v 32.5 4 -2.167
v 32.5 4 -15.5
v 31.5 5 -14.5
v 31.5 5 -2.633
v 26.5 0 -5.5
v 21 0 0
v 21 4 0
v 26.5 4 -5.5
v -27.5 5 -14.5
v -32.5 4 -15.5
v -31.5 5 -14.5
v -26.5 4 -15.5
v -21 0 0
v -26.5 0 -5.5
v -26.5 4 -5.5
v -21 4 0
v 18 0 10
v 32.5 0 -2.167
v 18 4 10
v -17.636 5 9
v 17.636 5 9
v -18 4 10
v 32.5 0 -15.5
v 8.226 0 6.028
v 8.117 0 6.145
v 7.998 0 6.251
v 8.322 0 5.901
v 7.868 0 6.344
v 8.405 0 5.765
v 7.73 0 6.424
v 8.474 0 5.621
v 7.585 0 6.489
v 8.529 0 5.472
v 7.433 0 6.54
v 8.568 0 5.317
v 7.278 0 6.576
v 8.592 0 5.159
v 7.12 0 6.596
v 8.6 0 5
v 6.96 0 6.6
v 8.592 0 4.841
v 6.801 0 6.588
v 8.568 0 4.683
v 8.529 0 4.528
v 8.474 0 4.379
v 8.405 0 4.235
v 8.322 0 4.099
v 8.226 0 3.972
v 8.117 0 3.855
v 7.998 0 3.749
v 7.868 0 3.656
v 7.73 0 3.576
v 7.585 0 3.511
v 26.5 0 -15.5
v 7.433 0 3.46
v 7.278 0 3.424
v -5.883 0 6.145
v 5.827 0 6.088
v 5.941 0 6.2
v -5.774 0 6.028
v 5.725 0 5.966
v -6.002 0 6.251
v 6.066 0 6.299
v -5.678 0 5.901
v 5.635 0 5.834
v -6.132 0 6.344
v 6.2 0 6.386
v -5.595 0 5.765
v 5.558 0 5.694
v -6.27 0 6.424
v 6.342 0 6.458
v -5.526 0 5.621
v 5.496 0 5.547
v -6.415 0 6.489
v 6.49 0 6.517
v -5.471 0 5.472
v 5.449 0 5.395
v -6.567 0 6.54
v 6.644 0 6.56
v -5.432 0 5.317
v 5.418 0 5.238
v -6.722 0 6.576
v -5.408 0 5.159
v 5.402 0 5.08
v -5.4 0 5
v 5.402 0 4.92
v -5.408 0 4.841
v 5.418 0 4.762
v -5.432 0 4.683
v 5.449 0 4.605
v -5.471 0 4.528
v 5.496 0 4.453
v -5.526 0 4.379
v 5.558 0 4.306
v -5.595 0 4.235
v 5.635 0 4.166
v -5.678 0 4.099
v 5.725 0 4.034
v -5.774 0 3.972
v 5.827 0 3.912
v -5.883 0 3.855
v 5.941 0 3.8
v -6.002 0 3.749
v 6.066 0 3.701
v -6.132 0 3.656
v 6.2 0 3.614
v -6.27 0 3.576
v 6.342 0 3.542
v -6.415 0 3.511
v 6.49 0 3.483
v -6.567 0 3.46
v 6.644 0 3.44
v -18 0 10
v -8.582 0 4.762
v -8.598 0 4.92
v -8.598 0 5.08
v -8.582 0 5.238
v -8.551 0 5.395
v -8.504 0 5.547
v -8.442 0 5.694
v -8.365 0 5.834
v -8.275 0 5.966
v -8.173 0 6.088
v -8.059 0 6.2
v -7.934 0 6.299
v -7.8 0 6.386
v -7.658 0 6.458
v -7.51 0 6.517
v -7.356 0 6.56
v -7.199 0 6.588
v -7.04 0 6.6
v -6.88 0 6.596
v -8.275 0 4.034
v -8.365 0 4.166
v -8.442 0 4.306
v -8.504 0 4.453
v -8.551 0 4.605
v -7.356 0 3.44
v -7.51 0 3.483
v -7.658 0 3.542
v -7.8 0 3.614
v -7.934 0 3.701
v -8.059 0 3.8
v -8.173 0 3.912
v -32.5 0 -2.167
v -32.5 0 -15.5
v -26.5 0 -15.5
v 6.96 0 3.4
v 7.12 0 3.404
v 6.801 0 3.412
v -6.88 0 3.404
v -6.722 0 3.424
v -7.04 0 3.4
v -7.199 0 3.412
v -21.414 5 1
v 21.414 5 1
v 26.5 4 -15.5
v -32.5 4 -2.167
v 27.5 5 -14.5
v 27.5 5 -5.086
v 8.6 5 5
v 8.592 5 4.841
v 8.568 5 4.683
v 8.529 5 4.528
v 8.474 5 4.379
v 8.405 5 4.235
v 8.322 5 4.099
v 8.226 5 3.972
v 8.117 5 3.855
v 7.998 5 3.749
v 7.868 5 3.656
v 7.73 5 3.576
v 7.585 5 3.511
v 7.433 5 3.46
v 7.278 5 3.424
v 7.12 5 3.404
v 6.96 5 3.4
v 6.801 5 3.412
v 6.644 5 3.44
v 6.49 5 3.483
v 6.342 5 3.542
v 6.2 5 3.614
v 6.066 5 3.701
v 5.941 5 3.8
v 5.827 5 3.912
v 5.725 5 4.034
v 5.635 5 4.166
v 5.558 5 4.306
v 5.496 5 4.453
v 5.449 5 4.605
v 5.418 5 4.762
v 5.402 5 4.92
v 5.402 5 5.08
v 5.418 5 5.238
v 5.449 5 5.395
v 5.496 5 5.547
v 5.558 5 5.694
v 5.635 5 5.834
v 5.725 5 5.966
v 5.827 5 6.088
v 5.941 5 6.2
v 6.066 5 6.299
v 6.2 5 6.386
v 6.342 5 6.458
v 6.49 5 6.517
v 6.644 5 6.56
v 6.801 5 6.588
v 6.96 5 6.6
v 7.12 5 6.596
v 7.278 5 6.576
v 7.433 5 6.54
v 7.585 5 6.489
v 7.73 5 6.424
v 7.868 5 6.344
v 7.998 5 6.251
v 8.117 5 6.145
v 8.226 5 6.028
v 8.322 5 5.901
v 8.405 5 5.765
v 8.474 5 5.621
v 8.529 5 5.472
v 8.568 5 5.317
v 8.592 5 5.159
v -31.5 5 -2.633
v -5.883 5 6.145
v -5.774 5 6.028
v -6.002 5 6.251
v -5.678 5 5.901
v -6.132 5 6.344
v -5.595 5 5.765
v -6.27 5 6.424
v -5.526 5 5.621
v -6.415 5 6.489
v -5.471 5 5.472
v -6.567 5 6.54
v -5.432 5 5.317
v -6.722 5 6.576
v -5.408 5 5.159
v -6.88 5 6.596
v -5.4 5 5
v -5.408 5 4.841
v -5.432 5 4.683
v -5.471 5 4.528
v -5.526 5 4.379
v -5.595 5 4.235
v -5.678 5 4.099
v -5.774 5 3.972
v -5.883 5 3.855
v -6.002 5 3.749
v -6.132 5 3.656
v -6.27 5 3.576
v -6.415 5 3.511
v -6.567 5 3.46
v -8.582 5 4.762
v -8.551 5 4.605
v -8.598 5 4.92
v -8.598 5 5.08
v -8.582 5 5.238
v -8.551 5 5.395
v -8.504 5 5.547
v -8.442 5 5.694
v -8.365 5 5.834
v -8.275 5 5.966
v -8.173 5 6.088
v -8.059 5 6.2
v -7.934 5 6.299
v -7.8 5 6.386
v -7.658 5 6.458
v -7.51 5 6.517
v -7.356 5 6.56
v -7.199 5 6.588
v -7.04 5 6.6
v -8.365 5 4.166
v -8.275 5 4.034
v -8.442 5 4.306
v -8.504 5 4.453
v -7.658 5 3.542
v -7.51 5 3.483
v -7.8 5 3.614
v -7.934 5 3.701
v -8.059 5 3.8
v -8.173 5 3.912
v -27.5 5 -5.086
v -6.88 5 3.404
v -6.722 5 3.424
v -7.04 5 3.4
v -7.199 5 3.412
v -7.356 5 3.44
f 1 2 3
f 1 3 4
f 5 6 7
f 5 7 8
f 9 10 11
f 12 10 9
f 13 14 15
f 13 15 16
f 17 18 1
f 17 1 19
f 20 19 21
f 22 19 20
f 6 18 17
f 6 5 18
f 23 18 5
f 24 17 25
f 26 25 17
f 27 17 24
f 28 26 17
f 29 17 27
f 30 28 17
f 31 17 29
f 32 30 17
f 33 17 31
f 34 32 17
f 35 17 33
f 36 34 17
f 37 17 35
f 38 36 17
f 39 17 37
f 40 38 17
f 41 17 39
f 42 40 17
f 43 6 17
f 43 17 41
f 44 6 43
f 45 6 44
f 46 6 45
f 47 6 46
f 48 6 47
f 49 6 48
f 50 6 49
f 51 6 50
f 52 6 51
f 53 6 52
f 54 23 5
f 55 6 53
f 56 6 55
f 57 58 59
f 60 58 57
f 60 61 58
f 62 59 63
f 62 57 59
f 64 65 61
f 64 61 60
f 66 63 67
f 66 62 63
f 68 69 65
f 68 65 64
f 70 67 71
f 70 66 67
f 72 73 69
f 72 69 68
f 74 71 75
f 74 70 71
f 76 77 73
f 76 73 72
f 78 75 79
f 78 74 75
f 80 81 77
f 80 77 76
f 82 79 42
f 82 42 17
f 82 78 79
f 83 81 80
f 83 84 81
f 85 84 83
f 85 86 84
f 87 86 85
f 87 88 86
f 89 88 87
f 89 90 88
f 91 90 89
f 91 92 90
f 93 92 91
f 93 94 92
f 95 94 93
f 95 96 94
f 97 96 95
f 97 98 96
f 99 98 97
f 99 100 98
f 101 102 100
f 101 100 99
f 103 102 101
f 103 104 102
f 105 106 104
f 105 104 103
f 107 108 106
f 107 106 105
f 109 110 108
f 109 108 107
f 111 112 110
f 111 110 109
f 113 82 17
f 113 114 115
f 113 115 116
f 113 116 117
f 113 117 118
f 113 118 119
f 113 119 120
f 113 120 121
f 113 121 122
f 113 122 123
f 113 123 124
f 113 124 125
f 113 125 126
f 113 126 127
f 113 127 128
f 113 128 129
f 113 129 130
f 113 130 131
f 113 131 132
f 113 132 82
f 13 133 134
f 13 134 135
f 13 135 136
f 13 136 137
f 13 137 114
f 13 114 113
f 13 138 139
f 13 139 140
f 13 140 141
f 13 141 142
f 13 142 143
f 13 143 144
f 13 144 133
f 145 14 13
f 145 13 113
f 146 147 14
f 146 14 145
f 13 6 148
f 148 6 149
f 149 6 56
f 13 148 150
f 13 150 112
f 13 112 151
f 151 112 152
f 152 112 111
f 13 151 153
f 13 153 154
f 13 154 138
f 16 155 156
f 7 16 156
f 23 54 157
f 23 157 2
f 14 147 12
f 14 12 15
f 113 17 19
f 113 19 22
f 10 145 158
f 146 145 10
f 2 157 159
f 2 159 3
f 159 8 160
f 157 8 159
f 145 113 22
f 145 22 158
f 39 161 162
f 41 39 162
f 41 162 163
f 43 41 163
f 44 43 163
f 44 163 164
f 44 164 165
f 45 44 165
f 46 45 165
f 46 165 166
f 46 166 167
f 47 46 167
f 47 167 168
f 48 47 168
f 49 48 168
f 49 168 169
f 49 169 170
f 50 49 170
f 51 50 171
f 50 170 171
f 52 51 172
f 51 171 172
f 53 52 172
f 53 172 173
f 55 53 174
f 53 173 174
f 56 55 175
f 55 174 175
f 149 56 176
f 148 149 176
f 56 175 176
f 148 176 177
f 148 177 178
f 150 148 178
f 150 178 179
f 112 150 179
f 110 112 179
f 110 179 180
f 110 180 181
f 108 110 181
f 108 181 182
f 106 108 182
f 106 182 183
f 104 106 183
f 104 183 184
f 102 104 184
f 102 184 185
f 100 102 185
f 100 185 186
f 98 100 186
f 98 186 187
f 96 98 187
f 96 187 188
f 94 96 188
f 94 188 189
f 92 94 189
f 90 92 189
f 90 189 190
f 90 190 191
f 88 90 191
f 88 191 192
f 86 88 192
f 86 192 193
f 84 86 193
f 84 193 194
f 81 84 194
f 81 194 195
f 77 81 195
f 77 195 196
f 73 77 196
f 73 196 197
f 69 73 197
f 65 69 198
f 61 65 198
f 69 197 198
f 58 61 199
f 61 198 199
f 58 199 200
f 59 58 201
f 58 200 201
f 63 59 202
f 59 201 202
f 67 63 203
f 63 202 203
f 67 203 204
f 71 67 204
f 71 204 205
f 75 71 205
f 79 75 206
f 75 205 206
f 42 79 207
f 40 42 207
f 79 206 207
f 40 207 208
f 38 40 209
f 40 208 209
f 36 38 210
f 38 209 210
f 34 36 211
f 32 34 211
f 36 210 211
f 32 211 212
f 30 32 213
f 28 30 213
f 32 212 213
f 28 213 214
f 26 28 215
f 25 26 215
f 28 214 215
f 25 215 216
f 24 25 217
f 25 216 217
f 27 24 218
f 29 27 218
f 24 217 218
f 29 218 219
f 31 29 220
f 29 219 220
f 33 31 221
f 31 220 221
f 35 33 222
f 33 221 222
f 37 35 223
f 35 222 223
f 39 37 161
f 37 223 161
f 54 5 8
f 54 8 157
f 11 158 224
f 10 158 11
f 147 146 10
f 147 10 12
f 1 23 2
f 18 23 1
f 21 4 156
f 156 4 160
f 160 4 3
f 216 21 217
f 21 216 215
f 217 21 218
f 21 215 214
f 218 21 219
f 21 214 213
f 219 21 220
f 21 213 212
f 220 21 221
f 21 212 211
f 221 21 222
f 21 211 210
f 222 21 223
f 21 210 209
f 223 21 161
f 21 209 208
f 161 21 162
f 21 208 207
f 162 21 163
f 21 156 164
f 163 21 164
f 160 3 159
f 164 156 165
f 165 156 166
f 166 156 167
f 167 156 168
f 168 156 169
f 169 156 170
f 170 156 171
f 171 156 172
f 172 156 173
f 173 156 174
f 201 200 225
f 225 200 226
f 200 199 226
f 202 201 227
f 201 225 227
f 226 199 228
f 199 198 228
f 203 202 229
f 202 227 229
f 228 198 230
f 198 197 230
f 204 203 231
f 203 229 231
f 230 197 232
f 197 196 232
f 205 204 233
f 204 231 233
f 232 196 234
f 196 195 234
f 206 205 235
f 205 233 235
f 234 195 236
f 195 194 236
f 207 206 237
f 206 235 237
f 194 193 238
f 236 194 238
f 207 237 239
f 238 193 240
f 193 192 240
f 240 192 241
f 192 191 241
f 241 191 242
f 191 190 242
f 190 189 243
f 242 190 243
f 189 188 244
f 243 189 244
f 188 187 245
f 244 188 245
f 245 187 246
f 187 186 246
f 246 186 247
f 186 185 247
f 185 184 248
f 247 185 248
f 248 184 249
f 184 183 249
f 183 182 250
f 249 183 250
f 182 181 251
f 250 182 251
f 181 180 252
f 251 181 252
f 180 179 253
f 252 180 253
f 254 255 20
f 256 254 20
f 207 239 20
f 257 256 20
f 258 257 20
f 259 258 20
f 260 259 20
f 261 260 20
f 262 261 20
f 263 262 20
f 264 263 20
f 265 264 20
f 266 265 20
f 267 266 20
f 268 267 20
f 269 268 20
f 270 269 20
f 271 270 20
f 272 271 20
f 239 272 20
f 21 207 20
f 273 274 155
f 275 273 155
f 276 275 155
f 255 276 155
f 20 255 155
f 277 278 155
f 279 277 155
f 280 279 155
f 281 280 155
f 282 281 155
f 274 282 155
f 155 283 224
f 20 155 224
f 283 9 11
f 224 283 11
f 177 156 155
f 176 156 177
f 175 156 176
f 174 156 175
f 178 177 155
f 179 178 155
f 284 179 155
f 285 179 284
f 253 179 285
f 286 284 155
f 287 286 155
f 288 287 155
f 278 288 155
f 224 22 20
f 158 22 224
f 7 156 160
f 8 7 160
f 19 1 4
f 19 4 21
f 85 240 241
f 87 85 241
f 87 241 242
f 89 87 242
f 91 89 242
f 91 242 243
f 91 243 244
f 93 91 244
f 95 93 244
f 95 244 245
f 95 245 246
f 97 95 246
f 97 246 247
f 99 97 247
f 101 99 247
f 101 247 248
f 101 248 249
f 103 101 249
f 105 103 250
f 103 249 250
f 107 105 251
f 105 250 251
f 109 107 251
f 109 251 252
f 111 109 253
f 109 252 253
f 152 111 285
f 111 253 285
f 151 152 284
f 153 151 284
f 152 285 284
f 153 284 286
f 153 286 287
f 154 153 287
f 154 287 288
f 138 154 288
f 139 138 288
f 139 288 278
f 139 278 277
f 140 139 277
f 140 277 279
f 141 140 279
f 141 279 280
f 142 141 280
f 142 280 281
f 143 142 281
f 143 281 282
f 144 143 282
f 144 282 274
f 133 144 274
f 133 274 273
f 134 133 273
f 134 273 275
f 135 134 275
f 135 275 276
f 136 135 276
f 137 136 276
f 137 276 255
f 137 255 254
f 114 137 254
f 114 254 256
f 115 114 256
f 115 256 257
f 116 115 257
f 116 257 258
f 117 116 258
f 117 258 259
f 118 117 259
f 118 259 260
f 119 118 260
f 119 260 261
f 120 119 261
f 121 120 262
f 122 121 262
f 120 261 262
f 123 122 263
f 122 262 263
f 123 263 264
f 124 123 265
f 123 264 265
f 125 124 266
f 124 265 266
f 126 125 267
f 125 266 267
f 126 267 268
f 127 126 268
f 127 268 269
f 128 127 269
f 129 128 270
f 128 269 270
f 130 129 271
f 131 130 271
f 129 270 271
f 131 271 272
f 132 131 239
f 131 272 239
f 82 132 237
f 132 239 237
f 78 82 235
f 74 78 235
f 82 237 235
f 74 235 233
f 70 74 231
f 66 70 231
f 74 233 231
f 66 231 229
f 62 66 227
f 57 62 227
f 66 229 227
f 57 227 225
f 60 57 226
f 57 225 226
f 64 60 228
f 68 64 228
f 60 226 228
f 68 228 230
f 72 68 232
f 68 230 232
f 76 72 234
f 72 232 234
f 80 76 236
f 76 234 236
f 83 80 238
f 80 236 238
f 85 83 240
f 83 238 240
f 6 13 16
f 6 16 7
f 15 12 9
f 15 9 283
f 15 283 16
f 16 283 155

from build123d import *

# Parameters (mm, degrees)
EXTRUDE_1_DEPTH     = 5
SKETCH_7_R          = 1.6
CUT_EXTRUDE_1_DEPTH = 6
CHAMFER_1_SIZE      = 1


with BuildPart() as part:
    # 草图1 → 凸台-拉伸1 (new body)
    with BuildSketch(Plane(origin=(0, 0, 0), x_dir=(1, 0, 0), z_dir=(0, 1, 0))):
        Polygon((-21, 0), (21, 0), (26.5, 5.5), (26.5, 15.5), (32.5, 15.5), (32.5, 2.166944652), (18, -10), (-18, -10), (-32.5, 2.166944652), (-32.5, 15.5), (-26.5, 15.5), (-26.5, 5.5), align=None)
    extrude(amount=EXTRUDE_1_DEPTH)

    # 草图7 → 切除-拉伸1 (cut, through all)
    with BuildSketch(Plane(origin=(0, 5, 0), x_dir=(1, 0, 0), z_dir=(0, 1, 0))):
        with Locations((-7, -5)):
            Circle(SKETCH_7_R)
        with Locations((7, -5)):
            Circle(SKETCH_7_R)
    extrude(amount=-CUT_EXTRUDE_1_DEPTH, mode=Mode.SUBTRACT)

    # 倒角1
    chamfer_1_edges = [part.edges().sort_by_distance(p)[0] for p in [
        (-23.75, 5, -2.75),
        (-26.5, 5, -10.5),
        (-29.5, 5, -15.5),
        (-32.5, 5, -8.833472326),
        (-25.25, 5, 3.916527674),
        (0, 5, 10),
        (25.25, 5, 3.916527674),
        (32.5, 5, -8.833472326),
        (29.5, 5, -15.5),
        (26.5, 5, -10.5),
        (23.75, 5, -2.75),
        (0, 5, 0),
    ]]
    chamfer(chamfer_1_edges, length=CHAMFER_1_SIZE)


solid = part.part
